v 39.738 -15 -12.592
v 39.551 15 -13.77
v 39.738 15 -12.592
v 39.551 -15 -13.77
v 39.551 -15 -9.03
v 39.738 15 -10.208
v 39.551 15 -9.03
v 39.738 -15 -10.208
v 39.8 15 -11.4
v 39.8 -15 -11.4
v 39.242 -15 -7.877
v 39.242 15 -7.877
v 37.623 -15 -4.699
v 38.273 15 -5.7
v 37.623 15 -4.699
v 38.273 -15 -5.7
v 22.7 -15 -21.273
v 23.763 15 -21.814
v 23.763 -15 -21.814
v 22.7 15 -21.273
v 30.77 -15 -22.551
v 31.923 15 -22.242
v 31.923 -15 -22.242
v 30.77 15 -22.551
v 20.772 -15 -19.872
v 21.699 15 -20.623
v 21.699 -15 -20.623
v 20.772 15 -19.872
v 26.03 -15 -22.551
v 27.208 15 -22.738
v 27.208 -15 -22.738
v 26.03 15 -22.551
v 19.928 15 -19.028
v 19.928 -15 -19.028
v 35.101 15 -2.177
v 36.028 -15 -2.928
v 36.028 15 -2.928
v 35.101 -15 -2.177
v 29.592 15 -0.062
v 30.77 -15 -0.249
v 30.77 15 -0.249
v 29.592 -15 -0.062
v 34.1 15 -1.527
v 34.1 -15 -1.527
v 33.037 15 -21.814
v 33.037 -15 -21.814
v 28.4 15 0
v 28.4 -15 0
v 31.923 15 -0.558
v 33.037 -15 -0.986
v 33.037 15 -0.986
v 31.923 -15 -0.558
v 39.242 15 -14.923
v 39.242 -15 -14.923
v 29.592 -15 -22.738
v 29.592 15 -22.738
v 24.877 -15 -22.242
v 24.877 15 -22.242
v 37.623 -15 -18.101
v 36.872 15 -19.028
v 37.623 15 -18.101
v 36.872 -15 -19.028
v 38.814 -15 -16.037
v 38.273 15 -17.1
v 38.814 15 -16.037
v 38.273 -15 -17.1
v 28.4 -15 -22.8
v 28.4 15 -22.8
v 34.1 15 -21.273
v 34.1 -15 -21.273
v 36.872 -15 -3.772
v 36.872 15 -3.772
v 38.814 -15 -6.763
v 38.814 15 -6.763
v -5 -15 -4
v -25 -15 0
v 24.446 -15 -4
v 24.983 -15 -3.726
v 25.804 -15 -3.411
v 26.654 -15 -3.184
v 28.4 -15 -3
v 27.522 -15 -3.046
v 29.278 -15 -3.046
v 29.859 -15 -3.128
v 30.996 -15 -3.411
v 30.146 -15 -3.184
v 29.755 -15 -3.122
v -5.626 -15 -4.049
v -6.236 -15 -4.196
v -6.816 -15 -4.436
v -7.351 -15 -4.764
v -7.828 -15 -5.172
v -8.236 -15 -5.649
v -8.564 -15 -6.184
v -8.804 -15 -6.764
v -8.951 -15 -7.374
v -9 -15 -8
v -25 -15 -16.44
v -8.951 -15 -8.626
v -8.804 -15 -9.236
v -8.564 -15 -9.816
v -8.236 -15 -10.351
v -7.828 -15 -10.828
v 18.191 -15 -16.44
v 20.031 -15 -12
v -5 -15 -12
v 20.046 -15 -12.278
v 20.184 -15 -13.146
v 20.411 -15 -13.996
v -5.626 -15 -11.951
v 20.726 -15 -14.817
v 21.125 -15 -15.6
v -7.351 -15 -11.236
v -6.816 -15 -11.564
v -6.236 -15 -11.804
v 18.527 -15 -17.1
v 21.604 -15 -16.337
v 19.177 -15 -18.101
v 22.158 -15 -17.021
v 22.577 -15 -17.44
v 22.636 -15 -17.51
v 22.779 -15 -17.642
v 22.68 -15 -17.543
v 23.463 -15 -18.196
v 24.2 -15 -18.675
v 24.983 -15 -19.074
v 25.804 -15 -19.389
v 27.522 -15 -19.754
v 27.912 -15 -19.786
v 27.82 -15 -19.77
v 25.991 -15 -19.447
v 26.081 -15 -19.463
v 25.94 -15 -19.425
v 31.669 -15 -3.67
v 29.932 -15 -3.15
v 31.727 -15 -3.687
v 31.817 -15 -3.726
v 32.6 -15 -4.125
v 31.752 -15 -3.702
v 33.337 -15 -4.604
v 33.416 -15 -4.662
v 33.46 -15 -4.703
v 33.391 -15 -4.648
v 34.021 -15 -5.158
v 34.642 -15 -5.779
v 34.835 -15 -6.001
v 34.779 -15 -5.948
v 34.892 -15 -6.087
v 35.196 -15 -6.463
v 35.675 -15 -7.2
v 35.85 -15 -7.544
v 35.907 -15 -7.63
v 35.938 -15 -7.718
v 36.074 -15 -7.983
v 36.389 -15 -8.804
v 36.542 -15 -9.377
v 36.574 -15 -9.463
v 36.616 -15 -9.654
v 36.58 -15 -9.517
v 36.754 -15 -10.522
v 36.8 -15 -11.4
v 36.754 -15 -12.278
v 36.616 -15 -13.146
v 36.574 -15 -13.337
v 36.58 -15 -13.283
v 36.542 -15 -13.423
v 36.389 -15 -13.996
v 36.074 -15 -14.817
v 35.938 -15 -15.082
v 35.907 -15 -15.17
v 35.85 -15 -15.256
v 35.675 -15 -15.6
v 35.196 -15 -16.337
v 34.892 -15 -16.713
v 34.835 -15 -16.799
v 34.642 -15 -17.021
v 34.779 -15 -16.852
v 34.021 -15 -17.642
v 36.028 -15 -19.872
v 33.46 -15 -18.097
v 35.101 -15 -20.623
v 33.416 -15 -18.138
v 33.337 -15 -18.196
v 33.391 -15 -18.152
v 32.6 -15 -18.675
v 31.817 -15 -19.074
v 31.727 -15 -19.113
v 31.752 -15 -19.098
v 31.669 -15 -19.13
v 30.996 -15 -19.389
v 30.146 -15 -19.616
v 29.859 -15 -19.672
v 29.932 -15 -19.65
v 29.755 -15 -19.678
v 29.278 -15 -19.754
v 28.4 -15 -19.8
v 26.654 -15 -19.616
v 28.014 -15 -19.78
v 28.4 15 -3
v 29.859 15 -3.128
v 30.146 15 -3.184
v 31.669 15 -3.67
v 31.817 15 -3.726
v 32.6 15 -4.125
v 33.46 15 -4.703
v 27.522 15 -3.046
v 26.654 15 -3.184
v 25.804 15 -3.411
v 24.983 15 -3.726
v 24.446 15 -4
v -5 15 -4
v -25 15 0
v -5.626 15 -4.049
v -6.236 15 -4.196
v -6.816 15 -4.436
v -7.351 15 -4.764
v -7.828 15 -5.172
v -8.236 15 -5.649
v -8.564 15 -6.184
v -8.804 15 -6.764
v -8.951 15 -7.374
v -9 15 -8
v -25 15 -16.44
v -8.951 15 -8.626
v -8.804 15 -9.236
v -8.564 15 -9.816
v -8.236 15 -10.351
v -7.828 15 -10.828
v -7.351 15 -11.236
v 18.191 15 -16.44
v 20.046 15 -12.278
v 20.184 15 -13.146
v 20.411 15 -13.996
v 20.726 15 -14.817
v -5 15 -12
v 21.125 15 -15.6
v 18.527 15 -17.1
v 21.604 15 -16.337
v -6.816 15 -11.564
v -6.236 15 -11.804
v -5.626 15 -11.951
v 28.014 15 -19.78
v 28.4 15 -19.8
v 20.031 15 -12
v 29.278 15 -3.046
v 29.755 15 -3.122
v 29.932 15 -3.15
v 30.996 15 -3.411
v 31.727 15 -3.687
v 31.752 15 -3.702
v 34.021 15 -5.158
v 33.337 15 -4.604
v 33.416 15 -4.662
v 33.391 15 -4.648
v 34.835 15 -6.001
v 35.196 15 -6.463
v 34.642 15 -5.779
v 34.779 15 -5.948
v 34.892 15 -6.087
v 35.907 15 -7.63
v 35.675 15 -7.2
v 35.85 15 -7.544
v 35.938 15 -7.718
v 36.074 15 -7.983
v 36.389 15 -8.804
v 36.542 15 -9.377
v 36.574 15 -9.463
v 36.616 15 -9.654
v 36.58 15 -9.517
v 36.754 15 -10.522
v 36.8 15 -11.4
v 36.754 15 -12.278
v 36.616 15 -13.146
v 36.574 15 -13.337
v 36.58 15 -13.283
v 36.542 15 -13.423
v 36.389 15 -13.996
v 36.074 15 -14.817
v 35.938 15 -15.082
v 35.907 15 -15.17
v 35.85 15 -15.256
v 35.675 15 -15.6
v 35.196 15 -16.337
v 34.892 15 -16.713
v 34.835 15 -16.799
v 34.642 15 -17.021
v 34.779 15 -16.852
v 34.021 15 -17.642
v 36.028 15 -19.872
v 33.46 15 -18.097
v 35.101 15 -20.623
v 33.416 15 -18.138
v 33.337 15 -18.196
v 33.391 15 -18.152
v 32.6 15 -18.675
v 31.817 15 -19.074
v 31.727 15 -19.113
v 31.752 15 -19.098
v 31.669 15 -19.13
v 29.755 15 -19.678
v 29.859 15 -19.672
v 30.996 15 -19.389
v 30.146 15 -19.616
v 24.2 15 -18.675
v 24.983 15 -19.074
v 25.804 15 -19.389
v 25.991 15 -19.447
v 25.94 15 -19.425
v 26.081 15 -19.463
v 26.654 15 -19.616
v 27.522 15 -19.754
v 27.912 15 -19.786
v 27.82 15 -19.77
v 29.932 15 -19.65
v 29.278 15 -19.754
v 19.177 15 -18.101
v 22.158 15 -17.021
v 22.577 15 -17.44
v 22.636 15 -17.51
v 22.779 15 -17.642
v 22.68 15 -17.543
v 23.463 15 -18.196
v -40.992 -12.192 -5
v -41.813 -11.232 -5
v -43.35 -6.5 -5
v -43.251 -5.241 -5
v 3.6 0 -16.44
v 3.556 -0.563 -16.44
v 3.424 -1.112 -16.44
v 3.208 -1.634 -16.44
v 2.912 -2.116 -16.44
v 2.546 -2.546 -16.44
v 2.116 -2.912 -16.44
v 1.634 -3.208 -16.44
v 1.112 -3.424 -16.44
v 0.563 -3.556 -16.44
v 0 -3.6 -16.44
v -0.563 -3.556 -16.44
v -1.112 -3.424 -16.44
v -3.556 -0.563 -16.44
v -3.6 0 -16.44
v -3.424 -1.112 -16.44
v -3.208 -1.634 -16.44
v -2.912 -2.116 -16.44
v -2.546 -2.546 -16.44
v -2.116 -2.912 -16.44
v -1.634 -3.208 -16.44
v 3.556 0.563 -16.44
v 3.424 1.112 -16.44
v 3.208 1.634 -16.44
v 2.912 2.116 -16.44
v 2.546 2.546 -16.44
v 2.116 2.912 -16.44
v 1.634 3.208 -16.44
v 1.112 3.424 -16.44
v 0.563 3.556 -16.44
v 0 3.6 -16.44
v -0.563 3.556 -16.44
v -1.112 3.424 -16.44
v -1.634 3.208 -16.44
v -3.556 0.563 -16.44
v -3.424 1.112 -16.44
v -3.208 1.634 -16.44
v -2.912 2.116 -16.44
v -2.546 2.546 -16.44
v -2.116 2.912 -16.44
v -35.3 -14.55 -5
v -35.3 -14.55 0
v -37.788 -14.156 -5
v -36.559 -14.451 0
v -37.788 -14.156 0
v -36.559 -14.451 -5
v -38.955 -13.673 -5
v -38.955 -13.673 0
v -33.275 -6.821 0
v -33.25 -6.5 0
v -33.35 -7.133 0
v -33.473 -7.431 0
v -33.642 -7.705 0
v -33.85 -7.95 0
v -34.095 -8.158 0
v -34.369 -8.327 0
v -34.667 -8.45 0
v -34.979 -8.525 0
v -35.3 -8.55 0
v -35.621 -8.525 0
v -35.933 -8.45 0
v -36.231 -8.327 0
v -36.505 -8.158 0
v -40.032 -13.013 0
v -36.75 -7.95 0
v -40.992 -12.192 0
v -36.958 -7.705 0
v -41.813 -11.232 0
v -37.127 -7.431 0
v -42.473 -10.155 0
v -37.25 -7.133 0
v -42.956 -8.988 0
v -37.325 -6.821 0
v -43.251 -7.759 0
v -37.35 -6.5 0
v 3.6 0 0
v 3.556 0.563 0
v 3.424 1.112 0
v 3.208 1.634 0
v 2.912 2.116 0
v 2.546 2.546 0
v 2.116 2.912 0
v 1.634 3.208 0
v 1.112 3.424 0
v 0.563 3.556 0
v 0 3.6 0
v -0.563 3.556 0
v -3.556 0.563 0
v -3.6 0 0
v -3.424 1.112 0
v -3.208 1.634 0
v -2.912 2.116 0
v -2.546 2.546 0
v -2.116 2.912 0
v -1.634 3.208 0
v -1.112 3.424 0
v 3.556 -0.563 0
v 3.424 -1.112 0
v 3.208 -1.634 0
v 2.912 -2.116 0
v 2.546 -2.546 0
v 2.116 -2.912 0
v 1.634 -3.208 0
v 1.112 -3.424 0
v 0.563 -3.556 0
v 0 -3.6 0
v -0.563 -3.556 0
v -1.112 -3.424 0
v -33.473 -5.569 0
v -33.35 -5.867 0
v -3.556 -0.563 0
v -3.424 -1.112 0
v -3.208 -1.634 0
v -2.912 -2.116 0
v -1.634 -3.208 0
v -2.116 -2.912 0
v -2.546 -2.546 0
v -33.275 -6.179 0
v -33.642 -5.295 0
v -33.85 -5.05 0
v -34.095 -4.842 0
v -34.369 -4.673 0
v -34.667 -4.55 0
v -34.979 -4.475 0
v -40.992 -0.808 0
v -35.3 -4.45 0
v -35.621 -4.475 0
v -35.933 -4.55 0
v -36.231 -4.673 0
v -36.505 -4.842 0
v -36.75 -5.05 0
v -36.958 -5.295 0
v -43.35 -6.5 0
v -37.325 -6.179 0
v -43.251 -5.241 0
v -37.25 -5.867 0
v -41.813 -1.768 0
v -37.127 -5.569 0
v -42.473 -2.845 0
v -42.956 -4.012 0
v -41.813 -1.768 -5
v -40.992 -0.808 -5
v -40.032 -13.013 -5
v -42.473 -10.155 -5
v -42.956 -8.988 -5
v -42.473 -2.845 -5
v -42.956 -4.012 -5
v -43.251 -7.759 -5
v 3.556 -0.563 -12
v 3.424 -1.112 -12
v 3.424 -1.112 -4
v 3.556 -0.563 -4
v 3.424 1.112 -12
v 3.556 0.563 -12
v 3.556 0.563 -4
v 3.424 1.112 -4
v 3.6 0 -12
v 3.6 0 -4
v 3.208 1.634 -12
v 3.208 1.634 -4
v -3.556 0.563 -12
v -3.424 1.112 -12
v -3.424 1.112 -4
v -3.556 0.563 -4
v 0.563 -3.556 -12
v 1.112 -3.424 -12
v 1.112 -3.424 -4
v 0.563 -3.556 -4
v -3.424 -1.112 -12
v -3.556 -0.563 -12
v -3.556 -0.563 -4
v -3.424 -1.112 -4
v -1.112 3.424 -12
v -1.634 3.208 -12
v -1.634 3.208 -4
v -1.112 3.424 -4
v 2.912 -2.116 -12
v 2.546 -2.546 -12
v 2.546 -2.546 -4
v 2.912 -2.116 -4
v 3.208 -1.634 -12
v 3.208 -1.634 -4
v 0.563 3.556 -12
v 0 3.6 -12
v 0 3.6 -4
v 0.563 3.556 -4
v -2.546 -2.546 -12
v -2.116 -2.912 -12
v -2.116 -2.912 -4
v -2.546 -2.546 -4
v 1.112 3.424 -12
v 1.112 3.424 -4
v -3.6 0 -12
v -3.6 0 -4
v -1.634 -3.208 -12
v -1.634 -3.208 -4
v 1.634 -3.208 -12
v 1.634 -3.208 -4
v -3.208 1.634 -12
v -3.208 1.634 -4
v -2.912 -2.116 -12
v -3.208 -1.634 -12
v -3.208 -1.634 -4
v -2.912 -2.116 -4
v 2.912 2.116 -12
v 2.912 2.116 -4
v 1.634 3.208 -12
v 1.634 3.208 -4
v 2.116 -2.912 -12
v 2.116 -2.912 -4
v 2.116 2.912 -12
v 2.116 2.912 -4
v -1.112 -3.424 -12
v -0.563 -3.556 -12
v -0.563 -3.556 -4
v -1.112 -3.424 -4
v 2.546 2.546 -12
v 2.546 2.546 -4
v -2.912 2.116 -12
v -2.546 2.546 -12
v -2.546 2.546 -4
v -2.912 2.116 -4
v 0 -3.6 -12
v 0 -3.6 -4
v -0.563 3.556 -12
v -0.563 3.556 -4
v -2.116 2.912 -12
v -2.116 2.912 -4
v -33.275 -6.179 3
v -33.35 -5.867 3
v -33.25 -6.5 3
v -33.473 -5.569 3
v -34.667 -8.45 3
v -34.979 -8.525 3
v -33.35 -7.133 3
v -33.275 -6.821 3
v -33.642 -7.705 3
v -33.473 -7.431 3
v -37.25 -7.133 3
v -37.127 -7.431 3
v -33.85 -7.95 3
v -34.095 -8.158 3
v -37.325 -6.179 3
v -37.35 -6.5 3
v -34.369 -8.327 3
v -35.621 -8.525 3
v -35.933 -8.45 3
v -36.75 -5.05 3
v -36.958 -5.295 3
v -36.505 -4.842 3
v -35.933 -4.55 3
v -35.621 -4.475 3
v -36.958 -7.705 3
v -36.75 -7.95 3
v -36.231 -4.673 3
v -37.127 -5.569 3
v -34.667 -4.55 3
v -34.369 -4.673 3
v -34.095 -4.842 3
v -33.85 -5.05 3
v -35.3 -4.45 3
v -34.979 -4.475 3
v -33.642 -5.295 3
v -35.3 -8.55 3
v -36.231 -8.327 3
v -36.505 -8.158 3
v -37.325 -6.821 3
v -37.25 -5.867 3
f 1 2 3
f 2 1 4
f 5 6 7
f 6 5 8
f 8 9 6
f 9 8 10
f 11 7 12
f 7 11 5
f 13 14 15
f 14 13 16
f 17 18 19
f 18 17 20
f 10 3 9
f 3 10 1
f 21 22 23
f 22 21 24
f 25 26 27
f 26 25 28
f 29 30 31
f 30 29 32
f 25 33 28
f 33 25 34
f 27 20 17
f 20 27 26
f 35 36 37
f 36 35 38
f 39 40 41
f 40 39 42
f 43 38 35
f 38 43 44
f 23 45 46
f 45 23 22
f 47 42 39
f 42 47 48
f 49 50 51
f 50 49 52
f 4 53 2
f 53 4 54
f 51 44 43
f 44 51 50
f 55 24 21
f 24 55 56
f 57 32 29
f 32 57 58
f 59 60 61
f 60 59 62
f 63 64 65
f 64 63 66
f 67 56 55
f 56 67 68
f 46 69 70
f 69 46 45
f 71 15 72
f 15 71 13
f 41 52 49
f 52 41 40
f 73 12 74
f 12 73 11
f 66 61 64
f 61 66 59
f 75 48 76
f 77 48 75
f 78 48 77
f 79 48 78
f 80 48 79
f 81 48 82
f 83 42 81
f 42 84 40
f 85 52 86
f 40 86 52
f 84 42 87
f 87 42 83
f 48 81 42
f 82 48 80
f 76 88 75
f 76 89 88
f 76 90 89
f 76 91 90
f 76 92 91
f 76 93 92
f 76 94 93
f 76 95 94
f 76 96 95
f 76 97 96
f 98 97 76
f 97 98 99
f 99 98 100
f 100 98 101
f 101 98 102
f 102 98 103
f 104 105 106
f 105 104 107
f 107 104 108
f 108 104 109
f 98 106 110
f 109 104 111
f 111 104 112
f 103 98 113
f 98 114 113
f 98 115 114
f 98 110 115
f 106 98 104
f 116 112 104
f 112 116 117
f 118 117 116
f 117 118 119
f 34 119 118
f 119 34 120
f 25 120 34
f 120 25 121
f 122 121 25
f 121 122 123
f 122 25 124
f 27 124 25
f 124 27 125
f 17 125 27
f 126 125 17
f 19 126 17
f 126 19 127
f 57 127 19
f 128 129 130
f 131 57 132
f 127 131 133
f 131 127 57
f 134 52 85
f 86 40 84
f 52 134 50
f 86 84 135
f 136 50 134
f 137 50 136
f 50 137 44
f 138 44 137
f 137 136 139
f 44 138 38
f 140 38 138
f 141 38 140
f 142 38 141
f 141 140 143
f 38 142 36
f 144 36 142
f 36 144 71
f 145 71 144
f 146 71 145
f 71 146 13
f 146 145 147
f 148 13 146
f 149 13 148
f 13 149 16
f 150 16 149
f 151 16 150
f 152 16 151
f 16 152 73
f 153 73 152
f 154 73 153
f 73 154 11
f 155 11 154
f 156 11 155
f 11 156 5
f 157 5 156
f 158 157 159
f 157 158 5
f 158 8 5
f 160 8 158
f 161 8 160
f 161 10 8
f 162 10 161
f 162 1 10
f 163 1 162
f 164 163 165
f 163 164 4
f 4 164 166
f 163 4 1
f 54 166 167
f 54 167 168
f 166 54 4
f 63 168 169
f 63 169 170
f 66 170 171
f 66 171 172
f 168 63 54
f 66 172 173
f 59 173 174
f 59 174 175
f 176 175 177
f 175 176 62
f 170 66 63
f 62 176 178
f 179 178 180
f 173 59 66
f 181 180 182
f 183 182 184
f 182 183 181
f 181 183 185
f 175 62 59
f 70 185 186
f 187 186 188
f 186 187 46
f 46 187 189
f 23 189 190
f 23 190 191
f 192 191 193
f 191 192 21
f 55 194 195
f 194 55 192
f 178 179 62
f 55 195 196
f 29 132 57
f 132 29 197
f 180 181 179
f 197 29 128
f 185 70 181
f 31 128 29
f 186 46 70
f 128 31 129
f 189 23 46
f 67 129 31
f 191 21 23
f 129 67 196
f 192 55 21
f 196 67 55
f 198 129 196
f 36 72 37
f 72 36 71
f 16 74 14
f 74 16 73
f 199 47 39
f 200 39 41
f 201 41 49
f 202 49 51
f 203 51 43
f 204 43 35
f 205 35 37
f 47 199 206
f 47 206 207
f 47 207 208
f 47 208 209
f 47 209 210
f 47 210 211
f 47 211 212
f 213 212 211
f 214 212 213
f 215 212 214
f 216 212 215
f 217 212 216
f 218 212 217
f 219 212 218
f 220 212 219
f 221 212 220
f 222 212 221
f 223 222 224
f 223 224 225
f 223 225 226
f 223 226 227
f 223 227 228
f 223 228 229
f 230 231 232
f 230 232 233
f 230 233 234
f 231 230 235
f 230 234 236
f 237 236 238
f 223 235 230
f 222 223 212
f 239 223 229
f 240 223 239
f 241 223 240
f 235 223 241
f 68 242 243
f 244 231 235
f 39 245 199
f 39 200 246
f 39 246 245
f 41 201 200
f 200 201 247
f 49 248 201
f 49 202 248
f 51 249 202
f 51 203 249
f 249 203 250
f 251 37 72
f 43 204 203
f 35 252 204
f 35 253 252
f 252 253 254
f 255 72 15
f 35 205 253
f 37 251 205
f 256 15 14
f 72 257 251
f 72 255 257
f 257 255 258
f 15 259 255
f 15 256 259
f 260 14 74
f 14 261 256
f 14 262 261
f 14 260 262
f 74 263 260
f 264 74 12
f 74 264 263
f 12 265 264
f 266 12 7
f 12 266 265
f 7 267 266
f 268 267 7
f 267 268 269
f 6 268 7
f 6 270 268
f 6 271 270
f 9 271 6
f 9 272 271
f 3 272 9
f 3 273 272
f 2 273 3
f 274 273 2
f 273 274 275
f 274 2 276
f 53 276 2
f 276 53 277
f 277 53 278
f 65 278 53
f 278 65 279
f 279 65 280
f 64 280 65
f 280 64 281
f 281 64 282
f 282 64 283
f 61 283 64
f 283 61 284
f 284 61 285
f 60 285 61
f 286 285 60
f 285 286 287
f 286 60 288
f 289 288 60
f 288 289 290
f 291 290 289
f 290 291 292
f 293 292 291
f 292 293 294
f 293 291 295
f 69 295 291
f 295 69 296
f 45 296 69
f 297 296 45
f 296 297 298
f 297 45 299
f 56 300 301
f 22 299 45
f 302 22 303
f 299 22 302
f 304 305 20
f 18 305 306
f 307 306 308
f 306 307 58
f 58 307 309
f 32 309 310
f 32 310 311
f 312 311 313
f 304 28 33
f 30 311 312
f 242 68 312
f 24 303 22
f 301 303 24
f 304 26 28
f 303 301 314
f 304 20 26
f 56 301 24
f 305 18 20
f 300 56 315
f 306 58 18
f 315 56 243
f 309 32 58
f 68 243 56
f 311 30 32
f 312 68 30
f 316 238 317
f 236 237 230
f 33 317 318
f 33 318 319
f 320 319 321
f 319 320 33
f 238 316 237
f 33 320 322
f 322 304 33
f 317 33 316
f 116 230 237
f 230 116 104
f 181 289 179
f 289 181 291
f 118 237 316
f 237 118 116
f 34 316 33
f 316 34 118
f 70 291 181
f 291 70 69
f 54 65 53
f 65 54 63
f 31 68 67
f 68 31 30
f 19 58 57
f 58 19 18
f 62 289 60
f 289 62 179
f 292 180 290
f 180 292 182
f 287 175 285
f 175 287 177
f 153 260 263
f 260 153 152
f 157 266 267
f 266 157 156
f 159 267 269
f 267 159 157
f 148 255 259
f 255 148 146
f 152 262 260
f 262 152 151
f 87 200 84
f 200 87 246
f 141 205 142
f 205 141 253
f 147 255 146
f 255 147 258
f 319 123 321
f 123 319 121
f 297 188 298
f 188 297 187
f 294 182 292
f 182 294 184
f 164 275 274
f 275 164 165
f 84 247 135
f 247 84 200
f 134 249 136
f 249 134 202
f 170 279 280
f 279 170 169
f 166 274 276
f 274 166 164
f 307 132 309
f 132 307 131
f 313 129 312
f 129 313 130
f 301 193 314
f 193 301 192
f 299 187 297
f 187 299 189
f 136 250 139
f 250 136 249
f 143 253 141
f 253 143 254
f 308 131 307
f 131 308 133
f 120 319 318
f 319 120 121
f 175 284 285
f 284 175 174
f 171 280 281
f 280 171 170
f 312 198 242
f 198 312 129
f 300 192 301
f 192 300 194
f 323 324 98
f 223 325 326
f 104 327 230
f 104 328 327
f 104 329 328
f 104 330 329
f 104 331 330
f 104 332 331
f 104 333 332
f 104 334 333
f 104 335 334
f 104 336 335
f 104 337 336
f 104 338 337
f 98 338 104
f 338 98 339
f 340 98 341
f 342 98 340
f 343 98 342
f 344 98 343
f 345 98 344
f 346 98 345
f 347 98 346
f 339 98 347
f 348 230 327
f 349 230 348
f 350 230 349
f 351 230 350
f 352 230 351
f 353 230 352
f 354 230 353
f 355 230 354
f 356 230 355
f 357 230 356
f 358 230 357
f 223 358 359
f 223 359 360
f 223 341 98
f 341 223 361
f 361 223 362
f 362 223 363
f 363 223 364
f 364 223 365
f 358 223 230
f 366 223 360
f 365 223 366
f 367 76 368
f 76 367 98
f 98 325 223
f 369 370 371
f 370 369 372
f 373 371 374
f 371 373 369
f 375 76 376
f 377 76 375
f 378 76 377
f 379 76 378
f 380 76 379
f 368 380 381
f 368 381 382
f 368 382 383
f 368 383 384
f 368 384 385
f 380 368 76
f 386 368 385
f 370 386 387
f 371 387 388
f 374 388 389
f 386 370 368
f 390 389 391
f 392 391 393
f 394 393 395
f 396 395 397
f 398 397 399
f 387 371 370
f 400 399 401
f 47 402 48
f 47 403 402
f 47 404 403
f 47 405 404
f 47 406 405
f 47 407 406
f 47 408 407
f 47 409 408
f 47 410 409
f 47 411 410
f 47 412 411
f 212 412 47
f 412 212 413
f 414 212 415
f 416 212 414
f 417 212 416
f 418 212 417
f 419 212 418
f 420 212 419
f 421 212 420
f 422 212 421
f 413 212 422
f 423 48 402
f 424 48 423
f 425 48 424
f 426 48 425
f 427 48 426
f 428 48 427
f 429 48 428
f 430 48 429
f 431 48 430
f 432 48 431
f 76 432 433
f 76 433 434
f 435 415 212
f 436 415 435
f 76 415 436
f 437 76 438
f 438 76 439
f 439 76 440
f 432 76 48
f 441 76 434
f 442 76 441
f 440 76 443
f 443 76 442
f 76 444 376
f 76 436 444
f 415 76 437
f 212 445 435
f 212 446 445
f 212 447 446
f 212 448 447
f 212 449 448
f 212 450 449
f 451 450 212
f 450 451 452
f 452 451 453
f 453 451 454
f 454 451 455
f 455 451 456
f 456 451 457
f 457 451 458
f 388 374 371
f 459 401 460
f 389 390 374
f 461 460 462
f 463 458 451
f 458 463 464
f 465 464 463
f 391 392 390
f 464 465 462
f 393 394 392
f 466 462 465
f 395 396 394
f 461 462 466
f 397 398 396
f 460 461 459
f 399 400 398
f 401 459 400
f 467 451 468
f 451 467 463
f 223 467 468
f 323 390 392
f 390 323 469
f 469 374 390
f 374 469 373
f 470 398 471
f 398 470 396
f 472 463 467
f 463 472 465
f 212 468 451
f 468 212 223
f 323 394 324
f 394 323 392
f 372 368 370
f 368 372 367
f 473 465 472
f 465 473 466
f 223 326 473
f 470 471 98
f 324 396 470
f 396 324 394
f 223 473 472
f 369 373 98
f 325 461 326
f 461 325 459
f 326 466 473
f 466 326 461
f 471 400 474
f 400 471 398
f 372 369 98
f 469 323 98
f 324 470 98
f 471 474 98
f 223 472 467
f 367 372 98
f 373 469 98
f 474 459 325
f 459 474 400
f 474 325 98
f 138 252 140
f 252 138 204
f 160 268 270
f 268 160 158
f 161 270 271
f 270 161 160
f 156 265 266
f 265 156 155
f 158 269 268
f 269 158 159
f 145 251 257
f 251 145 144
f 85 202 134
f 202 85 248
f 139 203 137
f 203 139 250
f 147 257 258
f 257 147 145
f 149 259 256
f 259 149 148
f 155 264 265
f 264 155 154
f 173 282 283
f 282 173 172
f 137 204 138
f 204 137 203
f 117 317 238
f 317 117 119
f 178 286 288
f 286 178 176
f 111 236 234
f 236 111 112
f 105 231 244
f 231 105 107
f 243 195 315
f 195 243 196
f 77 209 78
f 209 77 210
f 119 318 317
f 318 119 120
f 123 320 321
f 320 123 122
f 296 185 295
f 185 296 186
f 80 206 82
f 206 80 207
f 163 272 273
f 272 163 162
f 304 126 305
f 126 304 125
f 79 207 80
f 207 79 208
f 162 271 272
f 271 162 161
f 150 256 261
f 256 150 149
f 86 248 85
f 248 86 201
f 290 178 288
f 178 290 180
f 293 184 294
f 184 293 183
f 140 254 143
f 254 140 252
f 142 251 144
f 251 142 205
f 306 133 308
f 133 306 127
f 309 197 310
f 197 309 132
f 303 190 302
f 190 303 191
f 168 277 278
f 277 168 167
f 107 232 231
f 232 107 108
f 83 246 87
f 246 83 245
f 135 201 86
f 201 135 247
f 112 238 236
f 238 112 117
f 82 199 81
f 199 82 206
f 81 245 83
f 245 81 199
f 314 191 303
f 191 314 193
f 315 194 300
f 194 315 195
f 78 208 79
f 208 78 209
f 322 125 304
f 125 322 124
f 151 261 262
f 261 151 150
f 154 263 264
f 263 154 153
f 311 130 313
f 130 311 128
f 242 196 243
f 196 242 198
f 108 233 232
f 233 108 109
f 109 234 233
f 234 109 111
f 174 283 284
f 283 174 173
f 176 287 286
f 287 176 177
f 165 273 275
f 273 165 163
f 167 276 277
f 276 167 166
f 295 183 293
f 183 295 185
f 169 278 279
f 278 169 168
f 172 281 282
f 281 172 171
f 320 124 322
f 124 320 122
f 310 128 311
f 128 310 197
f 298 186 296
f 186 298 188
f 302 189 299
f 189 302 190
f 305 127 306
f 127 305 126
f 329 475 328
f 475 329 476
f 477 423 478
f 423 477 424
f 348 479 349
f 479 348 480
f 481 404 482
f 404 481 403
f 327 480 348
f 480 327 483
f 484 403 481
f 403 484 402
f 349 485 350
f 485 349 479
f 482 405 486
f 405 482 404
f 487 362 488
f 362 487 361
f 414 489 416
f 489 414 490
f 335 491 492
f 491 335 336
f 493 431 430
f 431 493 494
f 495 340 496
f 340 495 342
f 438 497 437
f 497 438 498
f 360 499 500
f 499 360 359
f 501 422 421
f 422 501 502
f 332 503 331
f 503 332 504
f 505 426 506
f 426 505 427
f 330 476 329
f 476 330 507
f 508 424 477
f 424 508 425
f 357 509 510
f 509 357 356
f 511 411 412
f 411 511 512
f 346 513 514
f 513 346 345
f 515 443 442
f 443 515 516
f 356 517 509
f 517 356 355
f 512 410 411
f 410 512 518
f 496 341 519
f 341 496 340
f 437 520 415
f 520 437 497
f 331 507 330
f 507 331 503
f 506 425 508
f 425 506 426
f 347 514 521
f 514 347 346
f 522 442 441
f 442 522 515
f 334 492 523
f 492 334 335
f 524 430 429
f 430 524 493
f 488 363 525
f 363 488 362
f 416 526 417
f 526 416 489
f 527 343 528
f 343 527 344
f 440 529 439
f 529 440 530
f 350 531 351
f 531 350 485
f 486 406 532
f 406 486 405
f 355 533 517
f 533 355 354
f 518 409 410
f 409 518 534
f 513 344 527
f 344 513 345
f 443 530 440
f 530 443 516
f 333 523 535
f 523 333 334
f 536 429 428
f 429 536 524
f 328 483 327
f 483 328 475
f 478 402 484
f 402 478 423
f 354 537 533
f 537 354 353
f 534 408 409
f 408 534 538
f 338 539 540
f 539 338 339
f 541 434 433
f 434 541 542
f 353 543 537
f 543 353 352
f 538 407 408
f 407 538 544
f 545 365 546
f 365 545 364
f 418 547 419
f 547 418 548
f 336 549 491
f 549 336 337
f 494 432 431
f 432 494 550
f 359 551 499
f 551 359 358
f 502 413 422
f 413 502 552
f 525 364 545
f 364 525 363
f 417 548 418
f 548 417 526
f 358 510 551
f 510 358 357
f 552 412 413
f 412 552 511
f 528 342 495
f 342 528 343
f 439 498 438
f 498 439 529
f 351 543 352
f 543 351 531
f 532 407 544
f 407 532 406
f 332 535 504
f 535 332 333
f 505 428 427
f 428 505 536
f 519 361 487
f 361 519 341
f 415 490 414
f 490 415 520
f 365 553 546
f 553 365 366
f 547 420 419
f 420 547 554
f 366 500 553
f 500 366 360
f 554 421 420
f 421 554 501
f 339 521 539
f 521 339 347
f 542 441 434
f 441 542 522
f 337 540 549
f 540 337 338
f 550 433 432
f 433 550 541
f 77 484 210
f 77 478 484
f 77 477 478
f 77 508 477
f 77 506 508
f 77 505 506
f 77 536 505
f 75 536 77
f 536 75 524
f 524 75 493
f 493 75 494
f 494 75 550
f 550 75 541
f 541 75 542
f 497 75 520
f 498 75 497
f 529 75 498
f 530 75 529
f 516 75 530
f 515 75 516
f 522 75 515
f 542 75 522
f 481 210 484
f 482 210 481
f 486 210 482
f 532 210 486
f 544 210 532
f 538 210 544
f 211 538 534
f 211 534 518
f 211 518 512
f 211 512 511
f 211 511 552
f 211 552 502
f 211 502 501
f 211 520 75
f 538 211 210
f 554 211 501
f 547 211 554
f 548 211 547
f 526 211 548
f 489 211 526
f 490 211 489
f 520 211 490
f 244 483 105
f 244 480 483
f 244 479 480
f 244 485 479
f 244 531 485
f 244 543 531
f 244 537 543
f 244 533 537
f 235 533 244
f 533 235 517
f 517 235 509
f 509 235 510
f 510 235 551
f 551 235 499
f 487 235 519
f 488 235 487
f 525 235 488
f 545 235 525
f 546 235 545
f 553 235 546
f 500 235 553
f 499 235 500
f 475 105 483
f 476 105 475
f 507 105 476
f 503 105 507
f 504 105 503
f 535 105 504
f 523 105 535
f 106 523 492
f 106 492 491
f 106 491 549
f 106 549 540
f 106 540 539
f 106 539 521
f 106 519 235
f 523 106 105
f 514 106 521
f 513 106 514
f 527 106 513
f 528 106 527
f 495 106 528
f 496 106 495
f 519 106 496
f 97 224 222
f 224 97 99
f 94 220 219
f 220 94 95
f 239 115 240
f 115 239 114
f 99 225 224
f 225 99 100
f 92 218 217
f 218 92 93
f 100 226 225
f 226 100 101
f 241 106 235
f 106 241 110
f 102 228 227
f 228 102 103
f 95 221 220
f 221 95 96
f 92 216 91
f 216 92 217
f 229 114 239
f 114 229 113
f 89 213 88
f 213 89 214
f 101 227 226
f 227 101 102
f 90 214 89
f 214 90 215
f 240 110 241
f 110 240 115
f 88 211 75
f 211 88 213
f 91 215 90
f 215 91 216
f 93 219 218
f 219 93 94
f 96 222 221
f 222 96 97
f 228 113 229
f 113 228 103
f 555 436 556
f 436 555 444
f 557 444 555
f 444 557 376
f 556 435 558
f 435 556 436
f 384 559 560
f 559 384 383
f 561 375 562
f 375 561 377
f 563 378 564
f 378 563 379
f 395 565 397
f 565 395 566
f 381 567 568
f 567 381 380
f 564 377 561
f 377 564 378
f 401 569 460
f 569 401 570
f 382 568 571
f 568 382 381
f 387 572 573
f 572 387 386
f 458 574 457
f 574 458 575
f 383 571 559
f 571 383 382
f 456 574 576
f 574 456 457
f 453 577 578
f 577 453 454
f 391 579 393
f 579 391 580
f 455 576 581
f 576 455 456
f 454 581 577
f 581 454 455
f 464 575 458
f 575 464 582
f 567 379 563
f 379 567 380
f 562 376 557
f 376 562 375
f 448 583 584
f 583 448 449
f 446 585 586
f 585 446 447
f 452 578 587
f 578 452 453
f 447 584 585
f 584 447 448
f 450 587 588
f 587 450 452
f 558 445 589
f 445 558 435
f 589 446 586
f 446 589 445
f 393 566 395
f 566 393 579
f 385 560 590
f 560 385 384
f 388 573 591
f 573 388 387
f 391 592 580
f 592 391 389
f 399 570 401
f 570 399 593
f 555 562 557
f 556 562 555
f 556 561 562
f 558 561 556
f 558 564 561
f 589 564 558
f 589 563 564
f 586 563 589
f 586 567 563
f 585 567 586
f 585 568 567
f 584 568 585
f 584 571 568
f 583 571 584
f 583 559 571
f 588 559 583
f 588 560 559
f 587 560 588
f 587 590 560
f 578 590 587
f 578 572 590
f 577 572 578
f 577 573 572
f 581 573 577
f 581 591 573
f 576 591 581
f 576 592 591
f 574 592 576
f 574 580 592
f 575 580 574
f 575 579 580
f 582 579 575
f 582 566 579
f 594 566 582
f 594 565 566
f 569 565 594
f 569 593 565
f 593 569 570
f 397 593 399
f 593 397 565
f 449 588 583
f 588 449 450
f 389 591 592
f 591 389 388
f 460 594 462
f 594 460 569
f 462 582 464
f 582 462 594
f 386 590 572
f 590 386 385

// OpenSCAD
pin_x=-35.3;
pin_y = -6.5;
bolt_r = 7.2/2;
pin_r = 4.1/2;
pin_h = 6;

wall_thickness = 3;
bar_r = 8.4;
width = 30;
gap=8;


bar_offset_x = 20 + bar_r;
bar_offset_z = -1 *(bar_r + wall_thickness);
main_thickness = wall_thickness + bar_r * 1.6;

pin_plate_thickness = 5;

module base(){
	union(){
		difference(){
			bar_holder();
			cylinder(r=bolt_r,100,center=true,$fn=40);
			translate([-5,-20,-12])cube([bar_offset_x + 5,40,gap]);
			translate([-5,0,-12+gap/2])rotate([90,0,0])cylinder(r=gap/2,h=40,center=true,$fn=40);
			
		}
		translate([pin_x,pin_y,0])cylinder(r=pin_r,pin_h,center=true,$fn=40);
	}
}

module bar_holder(){
	difference(){
		union(){
			translate([bar_offset_x,0,bar_offset_z])rotate([90,0,0])tube(ir=bar_r,h=width,or=bar_r + wall_thickness);
			hull(){
				translate([0,width/-2,-1*main_thickness])cube([bar_offset_x,width,main_thickness]);
				translate([-25,width/-2,-1*main_thickness])cube([bar_offset_x,width,main_thickness]);
				translate([pin_x,pin_y,-1*pin_plate_thickness])cylinder(r=pin_r+2*wall_thickness,pin_plate_thickness,$fn=40);
				translate([pin_x/3,0,-0.5*main_thickness])cylinder(r=width/2,main_thickness/2,$fn=40);
			}
		}
		translate([bar_offset_x,0,bar_offset_z])rotate([90,0,0])cylinder(r=bar_r,h=100,center=true,$fn=60);
	}
}

module tube(or,ir,h){
	difference(){
		cylinder(r=or,h=h,center=true,$fn=60);
		cylinder(r=ir,h=h+2,center=true);
	}
}

base();
